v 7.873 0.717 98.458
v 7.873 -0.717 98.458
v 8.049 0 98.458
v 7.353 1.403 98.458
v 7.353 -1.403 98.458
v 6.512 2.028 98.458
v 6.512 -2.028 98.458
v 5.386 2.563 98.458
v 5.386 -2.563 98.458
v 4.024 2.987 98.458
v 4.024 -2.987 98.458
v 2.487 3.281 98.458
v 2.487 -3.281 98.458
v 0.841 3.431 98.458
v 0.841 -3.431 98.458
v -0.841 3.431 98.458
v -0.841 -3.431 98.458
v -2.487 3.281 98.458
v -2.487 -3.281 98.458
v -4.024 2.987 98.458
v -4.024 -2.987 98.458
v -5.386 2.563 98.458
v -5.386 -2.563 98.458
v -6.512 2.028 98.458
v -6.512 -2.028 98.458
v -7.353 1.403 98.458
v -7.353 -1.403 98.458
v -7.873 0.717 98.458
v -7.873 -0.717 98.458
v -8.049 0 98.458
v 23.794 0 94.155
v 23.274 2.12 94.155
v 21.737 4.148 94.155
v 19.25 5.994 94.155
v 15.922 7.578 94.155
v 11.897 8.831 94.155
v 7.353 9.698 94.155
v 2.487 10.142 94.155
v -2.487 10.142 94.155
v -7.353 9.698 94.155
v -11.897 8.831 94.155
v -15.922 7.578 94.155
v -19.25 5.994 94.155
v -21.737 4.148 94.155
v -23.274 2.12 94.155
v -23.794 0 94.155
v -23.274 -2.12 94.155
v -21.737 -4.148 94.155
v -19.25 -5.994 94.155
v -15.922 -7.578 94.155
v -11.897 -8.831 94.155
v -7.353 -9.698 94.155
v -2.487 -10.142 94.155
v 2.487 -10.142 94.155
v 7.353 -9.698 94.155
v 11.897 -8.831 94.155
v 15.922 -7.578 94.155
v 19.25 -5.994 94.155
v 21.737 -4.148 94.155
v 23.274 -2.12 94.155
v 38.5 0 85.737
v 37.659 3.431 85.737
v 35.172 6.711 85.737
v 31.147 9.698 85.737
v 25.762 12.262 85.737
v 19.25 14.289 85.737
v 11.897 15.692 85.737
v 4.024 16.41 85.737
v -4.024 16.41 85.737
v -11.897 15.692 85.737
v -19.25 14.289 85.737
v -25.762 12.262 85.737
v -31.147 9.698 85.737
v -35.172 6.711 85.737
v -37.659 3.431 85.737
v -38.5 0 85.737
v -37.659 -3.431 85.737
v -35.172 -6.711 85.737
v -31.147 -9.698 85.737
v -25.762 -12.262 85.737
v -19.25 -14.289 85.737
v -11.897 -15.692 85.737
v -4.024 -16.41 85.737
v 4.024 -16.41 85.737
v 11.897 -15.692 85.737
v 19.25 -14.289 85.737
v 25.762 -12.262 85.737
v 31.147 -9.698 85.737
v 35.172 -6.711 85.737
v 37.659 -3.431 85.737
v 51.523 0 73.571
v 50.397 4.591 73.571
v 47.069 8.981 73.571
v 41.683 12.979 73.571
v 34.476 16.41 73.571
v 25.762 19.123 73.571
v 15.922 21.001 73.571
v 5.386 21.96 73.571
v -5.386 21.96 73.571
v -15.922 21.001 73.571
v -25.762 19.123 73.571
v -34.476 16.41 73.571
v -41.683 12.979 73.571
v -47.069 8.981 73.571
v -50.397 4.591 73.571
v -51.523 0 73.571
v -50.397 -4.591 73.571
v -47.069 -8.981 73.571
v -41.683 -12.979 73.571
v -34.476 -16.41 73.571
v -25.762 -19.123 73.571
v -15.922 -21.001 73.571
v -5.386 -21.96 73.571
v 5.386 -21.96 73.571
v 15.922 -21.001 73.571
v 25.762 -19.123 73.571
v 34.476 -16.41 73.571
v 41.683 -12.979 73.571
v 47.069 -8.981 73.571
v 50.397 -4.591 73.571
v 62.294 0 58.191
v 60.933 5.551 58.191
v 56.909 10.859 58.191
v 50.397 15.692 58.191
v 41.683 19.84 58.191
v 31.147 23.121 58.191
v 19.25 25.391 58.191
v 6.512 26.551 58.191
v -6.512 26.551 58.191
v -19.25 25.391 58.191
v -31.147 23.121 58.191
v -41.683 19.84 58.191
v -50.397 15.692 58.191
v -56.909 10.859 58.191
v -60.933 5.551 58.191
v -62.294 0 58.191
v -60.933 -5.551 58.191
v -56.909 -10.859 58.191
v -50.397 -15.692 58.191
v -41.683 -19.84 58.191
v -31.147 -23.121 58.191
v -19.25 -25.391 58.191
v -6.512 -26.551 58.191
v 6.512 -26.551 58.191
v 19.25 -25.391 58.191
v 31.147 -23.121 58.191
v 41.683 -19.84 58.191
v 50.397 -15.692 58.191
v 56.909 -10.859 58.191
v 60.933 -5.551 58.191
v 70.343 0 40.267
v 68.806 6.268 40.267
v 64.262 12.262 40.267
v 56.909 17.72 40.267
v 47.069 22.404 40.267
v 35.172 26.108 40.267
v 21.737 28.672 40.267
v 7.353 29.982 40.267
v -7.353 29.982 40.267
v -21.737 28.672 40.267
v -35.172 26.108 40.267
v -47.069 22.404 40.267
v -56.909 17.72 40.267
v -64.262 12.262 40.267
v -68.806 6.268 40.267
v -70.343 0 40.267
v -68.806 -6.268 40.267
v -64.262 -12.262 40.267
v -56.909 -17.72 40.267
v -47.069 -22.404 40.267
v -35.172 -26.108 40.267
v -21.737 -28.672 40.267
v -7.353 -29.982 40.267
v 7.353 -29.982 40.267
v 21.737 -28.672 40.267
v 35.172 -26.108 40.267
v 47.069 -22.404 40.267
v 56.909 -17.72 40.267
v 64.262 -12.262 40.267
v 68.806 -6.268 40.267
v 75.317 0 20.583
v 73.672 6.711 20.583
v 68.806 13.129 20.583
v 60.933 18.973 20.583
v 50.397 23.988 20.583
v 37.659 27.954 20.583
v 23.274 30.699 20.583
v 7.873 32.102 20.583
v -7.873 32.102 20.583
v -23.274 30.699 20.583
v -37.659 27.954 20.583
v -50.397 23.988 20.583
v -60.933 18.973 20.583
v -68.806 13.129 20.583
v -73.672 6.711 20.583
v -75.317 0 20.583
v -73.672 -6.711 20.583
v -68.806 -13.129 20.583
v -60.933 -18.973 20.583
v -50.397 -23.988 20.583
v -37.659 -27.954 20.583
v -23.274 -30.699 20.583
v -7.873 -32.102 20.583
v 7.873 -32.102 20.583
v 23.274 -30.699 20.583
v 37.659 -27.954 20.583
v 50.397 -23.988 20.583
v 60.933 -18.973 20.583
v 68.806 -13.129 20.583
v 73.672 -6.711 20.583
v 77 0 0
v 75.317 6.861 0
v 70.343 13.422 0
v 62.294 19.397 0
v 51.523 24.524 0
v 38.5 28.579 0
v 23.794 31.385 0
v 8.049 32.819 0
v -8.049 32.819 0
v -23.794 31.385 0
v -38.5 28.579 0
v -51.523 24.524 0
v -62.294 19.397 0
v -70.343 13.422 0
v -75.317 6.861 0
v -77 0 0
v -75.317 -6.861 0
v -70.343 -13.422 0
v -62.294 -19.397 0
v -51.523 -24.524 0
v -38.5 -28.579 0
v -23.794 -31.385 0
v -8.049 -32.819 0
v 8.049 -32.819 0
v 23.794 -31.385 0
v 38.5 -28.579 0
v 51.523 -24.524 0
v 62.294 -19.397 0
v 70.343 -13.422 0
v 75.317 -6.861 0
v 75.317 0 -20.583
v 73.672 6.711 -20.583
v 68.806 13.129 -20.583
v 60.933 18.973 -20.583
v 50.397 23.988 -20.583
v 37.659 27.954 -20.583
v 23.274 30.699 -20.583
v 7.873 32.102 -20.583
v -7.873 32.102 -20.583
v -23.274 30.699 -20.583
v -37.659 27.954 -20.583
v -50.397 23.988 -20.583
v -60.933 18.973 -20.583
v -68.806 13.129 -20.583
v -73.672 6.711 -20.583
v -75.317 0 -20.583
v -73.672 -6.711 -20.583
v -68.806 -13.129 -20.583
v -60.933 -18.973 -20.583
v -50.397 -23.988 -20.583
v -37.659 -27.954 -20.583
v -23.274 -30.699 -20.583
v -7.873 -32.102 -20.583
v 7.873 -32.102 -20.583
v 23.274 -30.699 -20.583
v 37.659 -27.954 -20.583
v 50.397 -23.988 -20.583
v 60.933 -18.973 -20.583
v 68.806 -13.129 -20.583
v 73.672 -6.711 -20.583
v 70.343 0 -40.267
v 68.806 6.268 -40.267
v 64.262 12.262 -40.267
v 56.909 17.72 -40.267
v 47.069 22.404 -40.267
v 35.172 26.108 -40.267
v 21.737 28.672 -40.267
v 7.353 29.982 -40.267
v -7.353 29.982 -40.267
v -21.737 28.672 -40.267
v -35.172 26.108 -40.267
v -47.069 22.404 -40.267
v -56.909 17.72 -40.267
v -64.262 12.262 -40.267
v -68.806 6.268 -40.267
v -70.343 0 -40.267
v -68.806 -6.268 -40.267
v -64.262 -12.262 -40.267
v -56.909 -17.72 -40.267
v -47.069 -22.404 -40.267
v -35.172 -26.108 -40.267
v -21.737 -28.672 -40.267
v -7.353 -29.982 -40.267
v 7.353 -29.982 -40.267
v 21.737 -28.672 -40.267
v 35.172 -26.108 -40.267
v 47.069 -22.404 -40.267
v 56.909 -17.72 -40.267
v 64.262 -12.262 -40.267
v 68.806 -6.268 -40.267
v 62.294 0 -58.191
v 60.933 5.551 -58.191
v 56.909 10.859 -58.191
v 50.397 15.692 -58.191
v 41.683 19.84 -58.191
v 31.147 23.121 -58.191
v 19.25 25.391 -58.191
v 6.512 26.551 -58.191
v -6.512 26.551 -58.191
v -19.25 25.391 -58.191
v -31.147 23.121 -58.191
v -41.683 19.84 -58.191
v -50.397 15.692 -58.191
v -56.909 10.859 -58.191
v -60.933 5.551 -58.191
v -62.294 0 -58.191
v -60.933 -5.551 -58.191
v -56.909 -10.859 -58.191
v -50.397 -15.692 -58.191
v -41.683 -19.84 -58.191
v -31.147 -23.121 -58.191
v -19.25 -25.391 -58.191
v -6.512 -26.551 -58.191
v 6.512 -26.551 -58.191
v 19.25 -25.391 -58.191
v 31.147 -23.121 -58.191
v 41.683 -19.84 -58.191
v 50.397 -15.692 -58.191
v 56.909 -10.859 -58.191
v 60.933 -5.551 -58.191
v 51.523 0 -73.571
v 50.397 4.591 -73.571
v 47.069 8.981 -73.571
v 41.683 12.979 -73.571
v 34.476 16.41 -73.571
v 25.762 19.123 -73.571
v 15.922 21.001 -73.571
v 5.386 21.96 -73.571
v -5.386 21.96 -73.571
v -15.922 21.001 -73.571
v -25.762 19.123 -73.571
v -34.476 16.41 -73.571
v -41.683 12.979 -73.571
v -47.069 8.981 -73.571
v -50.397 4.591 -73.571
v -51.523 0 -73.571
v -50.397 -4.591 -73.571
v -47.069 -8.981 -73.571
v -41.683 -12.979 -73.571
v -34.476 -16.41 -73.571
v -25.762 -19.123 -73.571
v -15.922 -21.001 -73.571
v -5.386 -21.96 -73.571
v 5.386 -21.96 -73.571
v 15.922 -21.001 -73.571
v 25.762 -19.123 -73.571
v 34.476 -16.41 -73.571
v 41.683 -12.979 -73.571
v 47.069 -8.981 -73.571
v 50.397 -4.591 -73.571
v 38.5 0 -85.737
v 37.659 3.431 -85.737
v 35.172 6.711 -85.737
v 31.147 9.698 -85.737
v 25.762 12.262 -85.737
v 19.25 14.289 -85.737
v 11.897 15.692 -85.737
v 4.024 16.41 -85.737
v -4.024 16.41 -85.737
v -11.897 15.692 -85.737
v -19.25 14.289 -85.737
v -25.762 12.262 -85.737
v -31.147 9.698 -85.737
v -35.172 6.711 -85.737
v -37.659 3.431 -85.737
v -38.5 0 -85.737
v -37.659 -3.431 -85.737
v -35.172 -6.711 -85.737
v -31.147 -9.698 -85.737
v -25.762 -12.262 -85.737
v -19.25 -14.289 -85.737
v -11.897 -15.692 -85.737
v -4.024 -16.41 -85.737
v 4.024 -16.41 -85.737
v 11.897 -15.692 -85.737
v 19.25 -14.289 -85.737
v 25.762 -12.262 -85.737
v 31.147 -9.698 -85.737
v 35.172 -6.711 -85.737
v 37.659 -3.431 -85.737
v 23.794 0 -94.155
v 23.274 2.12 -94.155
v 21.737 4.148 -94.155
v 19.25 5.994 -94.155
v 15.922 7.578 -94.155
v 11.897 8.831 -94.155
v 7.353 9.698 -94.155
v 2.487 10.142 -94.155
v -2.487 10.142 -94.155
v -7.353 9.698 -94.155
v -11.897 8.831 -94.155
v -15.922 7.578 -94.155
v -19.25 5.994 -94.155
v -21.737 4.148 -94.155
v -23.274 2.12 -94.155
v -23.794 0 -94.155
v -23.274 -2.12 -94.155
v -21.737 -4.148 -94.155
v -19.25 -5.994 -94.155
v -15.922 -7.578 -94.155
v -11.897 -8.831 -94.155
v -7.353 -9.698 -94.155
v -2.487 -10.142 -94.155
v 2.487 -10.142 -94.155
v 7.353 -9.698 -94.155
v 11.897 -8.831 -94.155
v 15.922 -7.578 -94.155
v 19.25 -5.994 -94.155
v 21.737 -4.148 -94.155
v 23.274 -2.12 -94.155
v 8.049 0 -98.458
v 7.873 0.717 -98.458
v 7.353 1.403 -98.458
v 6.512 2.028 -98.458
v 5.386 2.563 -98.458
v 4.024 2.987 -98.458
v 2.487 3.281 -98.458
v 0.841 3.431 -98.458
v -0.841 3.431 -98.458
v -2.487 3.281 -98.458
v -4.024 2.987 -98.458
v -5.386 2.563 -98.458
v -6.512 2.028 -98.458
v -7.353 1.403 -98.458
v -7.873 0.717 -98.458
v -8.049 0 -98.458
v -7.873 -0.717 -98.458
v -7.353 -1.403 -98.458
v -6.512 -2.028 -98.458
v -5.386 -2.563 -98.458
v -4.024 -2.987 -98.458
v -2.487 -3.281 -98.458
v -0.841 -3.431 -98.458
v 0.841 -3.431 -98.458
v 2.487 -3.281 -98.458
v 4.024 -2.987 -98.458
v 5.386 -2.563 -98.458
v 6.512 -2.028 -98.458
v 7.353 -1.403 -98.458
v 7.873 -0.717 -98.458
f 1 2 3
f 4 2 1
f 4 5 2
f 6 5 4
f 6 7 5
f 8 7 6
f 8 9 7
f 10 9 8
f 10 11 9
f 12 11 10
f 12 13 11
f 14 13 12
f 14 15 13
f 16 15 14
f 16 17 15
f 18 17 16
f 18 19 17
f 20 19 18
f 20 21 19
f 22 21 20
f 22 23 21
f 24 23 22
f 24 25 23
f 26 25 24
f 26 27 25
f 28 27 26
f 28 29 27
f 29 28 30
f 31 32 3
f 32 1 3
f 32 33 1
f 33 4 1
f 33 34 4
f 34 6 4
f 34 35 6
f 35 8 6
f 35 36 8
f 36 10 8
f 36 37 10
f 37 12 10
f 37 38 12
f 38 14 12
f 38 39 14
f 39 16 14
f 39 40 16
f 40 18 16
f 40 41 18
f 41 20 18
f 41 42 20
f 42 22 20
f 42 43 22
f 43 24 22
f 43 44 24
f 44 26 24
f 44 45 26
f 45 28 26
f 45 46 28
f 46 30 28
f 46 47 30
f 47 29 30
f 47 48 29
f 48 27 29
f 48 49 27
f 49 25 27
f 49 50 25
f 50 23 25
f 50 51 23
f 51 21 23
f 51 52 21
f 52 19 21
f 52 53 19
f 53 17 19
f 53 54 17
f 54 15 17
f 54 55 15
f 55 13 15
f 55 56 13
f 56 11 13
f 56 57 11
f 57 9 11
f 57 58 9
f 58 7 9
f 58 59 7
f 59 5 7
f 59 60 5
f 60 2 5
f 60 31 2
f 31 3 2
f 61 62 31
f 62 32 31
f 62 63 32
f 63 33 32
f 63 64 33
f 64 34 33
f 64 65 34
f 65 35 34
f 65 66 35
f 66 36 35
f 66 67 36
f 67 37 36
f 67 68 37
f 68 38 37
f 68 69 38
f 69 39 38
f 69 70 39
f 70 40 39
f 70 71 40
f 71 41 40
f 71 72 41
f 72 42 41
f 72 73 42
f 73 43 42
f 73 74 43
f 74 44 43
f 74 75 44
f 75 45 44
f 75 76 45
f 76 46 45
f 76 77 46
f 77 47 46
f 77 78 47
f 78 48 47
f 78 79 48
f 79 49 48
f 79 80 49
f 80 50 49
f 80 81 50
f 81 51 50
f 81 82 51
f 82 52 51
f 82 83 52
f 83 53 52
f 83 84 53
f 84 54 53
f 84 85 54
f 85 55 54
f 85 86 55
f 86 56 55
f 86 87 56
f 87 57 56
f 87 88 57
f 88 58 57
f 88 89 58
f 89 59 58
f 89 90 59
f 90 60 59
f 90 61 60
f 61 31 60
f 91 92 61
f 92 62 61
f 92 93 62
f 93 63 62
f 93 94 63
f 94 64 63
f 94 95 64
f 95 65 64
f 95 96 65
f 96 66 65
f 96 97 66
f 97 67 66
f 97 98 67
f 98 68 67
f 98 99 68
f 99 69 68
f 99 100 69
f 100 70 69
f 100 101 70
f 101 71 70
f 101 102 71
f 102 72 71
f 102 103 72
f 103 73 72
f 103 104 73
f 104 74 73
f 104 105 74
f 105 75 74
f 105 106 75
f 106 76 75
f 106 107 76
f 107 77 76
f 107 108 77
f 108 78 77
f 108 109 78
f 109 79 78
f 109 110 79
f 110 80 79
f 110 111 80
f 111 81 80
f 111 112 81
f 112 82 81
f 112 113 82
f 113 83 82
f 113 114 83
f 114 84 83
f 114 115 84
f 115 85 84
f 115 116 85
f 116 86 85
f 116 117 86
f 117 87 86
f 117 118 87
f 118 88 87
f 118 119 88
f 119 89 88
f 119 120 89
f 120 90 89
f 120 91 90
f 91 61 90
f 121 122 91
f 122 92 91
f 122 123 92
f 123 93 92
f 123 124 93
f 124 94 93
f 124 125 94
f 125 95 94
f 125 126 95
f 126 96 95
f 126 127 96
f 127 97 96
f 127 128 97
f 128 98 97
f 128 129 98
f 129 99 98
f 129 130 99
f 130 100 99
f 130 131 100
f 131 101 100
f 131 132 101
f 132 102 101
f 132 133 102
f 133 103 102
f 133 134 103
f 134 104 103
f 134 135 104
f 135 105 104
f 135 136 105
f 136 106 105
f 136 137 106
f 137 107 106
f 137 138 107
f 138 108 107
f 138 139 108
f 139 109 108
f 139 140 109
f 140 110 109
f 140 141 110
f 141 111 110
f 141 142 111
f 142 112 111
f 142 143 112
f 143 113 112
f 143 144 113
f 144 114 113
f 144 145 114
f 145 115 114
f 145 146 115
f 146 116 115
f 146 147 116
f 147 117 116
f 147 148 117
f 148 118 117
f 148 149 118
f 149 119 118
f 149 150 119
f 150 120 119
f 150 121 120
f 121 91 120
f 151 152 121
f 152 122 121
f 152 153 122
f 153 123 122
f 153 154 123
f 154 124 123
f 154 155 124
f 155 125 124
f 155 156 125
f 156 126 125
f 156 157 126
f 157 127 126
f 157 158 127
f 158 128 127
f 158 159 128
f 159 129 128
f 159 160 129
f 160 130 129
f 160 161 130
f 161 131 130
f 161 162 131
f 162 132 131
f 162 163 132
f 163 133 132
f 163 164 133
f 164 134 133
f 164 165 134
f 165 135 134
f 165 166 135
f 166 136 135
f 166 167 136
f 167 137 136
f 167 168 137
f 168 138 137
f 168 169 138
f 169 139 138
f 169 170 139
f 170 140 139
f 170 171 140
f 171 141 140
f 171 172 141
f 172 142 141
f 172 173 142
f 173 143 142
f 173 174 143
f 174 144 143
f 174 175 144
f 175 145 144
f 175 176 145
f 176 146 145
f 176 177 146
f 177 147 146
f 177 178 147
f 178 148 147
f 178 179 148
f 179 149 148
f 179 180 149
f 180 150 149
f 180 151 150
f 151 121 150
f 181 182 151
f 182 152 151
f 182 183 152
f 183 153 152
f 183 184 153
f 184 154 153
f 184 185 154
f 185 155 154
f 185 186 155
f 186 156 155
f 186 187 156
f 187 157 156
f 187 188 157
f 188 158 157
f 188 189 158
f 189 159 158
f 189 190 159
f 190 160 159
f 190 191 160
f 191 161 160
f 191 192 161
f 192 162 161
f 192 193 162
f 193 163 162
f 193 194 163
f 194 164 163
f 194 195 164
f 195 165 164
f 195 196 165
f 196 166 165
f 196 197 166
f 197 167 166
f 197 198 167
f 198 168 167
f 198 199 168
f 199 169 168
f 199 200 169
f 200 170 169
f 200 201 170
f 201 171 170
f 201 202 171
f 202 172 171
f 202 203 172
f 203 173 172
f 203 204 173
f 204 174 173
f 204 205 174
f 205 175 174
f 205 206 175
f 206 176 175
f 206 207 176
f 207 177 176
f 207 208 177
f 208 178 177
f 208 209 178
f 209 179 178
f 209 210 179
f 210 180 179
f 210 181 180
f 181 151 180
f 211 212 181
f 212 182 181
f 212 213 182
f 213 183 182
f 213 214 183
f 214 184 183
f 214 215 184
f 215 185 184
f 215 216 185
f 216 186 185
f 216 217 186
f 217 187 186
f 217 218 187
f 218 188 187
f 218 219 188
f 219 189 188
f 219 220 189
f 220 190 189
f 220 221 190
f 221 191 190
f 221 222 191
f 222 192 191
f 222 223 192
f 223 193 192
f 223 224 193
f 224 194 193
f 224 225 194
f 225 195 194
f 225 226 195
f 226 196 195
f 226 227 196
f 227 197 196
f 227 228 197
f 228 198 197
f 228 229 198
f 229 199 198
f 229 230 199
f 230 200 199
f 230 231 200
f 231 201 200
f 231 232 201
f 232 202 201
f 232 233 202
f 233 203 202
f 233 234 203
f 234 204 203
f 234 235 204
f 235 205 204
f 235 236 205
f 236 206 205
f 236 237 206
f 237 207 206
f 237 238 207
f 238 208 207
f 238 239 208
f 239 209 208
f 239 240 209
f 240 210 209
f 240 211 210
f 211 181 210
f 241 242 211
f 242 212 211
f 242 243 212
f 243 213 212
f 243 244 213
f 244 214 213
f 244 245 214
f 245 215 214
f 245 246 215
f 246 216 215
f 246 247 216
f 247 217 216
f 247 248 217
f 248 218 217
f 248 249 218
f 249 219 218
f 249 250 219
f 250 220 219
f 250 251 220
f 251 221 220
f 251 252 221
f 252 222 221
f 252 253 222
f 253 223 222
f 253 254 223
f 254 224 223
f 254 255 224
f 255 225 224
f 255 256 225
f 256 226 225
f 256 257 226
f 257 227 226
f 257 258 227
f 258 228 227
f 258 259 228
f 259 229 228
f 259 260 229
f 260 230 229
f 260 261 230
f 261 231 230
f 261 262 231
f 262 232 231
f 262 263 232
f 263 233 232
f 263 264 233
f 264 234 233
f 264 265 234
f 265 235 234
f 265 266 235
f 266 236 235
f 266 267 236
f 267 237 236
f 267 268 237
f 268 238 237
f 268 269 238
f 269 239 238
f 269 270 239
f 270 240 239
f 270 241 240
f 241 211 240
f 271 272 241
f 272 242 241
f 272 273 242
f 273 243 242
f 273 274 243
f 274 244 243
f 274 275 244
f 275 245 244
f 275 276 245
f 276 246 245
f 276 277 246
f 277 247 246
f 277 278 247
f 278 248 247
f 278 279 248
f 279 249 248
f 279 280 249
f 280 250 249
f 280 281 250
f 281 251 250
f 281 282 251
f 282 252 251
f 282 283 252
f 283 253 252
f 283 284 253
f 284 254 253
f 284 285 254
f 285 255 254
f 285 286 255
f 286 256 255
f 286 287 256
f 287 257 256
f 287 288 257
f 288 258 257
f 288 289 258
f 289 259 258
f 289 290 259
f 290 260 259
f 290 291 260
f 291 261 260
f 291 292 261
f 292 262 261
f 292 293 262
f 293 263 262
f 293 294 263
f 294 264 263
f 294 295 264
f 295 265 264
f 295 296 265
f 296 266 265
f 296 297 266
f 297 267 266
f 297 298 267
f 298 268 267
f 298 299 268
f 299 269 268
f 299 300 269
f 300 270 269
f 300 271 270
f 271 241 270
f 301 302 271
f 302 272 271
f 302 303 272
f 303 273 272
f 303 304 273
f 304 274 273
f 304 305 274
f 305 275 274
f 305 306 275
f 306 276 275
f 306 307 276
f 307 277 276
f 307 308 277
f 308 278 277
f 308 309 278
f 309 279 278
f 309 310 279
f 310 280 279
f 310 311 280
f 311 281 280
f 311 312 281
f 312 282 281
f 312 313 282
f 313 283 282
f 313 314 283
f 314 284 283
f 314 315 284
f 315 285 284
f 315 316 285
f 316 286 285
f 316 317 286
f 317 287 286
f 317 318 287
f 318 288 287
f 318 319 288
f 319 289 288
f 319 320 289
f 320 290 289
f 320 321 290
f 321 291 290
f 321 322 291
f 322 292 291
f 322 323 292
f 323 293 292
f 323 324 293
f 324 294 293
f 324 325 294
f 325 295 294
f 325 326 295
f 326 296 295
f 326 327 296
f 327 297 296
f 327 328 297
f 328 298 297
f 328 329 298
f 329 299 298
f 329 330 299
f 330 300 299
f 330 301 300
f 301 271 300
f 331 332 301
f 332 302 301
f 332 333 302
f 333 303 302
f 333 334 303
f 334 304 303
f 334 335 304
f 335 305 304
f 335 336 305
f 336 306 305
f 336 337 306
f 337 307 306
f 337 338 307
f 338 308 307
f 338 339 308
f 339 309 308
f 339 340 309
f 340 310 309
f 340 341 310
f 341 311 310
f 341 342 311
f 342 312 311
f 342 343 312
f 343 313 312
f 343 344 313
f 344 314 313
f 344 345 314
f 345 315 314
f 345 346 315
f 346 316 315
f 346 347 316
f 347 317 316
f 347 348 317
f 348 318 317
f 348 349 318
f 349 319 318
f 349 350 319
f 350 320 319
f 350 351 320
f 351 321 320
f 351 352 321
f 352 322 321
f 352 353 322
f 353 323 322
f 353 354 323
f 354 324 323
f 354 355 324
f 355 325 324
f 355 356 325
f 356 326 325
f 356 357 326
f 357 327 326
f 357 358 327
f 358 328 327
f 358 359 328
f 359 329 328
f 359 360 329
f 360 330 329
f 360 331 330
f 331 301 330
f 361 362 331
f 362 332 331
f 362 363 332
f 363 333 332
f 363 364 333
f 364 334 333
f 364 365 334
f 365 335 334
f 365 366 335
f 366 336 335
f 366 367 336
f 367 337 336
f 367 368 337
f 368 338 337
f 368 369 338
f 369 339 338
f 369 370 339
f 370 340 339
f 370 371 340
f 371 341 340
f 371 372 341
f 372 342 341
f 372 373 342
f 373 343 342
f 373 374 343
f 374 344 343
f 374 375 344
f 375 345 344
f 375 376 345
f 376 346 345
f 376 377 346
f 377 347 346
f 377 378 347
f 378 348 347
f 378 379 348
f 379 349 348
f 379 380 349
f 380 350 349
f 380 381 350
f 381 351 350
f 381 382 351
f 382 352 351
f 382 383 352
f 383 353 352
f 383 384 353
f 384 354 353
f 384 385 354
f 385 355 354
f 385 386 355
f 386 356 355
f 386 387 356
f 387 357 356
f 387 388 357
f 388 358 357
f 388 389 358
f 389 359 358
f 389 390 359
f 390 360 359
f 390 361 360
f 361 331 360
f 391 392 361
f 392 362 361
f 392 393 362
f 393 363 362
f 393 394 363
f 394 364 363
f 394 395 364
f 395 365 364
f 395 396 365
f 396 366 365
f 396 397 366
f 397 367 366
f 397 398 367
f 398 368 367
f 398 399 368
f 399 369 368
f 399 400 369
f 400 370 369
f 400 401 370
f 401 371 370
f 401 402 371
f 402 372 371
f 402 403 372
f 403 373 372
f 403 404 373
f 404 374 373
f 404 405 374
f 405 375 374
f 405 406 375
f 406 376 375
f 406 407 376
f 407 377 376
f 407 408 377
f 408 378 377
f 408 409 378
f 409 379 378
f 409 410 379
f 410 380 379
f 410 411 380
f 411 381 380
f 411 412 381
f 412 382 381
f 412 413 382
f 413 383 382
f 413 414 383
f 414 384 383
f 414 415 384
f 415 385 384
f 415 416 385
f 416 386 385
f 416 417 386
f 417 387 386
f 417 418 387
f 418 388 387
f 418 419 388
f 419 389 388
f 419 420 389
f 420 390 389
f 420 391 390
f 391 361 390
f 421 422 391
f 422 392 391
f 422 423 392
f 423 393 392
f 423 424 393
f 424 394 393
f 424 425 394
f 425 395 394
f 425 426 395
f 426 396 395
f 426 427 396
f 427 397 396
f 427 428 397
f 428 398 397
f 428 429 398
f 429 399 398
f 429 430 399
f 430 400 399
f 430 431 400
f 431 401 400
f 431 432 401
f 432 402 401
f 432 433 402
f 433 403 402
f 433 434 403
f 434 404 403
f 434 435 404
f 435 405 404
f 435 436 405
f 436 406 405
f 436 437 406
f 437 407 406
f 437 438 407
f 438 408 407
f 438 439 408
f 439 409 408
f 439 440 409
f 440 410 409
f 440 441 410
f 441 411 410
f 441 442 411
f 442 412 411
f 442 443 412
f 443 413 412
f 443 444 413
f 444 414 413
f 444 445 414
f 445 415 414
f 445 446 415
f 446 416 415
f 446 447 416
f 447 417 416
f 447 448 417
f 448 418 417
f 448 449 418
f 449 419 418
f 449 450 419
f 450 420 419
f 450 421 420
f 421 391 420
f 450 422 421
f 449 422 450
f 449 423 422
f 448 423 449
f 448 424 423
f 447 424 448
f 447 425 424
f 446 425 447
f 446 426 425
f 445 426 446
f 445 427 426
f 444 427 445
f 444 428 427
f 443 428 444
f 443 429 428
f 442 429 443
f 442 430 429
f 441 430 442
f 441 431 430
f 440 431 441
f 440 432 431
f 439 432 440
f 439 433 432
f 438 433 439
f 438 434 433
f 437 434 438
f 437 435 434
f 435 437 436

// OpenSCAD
// Generated by SolidPython 1.0.1 on 2020-07-29 00:46:47


scale(v = [7, 3, 9]) {
	sphere(r = 11);
}
/***********************************************
*********      SolidPython code:      **********
************************************************
 
# import packages: SolidPython
from solid import *
from solid.utils import *
from itertools import chain, combinations, permutations


class Resize:

    def __init__(self, scad_file):
        self.scad_file = scad_file
        #self.scad_file = import_scad(scad_file)
        # cone/cylinder param:
        self.r1 = 0
        self.r2 = 0
        self.h = 0
        # rectangular prism param:
        self.w = 0
        self.l = 0
        # ellipse param:
        self.r = 0

    # import OpenScad code (file name corresponds to shape)


    # classify shape + parameters
    def assign(self, param1, param2, param3):
        if self.scad_file == 'cone.scad':
            self.r1 = param1
            self.r2 = param2
            self.h = param3
        elif self.scad_file == 'cylinder.scad':
            self.r1 = param1
            self.r2 = param2
            self.h = param3
        elif self.scad_file == 'rectangularPrism.scad':
            self.h = param1
            self.l = param2
            self.w = param3
        else:
            self.r = param1
            self.h = param2

    # resize parameters
    def iterate(self):
        x = range(3, 20, 2)
        i = 1
        if self.scad_file == 'cone.scad':
            tempList = list(permutations(x, 2))
            for temp in tempList:
                param1 = temp[0]
                param2 = temp[1]
                filepath = 'produced_scad_files/' + 'cone' + str(param1) + '_' + str(param2) + '_' + '.scad'
                scad_render_to_file(cylinder(h=param1, r1=param2, r2=0), filepath)

        elif self.scad_file == 'cylinder.scad':
            tempList = list(permutations(x, 3))
            for temp in tempList:
                param1 = temp[0]
                param2 = temp[1]
                filepath = 'produced_scad_files/' + 'cylinder' + str(param1) + '_' + str(param2) + '_' + '.scad'
                scad_render_to_file(cylinder(h=param1, r1=param2, r2=param2), filepath)

        elif self.scad_file == 'rectangularPrism.scad':
            tempList = list(permutations(x, 3))
            for temp in tempList:
                param1 = temp[0]
                param2 = temp[1]
                param3 = temp[2]
                filepath = 'produced_scad_files/' + 'rectangularPrism' + str(param1) + '_' + str(param2) + '_' + str(
                    param3) + '.scad'
                scad_render_to_file(cube(size=(param1, param2, param3)), filepath)

        elif self.scad_file == 'ellipse.scad':
            tempList = list(permutations(x, 4))
            for temp in tempList:
                param1 = temp[0]
                param2 = temp[1]
                param3 = temp[2]
                param4 = temp[3]
                filepath = 'produced_scad_files/' + 'ellipse' + str(param1) + '_' + str(param2) + '_' + str(param3) + '_' + str(param4) + '.scad'
                scad_render_to_file(scale([param1, param2, param3])(sphere(r=param4)), filepath)

    def render_to_scadfile(self):
        scad_render_to_file(scad, 'example.scad') 
 
************************************************/
